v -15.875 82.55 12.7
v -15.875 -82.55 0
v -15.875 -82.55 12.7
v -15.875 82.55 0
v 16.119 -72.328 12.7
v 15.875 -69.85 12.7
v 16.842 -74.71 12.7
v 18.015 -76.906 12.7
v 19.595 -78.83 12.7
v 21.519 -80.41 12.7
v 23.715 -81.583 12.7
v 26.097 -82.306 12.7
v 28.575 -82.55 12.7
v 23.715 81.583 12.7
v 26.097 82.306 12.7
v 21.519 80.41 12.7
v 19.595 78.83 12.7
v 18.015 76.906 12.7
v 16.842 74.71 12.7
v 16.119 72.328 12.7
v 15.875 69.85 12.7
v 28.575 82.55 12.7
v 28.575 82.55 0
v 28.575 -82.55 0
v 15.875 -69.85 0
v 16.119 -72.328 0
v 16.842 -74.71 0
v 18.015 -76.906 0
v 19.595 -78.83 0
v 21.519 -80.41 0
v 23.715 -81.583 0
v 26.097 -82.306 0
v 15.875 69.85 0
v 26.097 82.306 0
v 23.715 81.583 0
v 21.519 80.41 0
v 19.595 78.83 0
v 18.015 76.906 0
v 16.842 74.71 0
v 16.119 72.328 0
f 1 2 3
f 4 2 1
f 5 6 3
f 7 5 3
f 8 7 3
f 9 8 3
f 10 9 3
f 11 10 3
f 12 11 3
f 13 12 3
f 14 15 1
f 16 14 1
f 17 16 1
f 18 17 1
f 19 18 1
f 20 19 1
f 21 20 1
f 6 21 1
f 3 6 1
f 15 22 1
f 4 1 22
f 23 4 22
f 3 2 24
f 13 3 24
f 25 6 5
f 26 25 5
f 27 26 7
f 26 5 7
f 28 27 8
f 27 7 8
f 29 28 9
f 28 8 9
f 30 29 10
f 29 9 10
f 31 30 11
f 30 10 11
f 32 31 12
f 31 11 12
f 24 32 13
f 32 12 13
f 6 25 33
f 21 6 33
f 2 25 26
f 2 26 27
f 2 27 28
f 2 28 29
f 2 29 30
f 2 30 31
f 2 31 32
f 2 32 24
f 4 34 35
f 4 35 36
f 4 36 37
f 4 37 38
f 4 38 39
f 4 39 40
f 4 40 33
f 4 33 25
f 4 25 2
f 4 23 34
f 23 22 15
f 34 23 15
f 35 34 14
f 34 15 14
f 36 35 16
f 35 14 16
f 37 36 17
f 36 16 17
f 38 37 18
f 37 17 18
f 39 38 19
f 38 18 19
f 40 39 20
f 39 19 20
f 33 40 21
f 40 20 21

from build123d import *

# Parameters (mm, degrees)
SKETCH1_W           = 31.75
SKETCH1_H           = 165.1
BOSS_EXTRUDE1_DEPTH = 12.7
BOSS_EXTRUDE2_DEPTH = 12.7


with BuildPart() as part:
    # Sketch1 → Boss-Extrude1 (new body)
    with BuildSketch(Plane.XY):
        Rectangle(SKETCH1_W, SKETCH1_H)
    extrude(amount=BOSS_EXTRUDE1_DEPTH)

    # Sketch2 → Boss-Extrude2 (add)
    with BuildSketch(Plane.XY.offset(12.7)):
        with BuildLine():
            Line((15.875, 82.55), (28.575, 82.55))
            ThreePointArc((28.575, 82.55), (19.594743879, 78.830256121), (15.875, 69.85))
            Line((15.875, 69.85), (15.875, 82.55))
        make_face()
        with BuildLine():
            Line((15.875, -82.55), (15.875, -69.85))
            ThreePointArc((15.875, -69.85), (19.594743879, -78.830256121), (28.575, -82.55))
            Line((28.575, -82.55), (15.875, -82.55))
        make_face()
    extrude(amount=-BOSS_EXTRUDE2_DEPTH)


solid = part.part
